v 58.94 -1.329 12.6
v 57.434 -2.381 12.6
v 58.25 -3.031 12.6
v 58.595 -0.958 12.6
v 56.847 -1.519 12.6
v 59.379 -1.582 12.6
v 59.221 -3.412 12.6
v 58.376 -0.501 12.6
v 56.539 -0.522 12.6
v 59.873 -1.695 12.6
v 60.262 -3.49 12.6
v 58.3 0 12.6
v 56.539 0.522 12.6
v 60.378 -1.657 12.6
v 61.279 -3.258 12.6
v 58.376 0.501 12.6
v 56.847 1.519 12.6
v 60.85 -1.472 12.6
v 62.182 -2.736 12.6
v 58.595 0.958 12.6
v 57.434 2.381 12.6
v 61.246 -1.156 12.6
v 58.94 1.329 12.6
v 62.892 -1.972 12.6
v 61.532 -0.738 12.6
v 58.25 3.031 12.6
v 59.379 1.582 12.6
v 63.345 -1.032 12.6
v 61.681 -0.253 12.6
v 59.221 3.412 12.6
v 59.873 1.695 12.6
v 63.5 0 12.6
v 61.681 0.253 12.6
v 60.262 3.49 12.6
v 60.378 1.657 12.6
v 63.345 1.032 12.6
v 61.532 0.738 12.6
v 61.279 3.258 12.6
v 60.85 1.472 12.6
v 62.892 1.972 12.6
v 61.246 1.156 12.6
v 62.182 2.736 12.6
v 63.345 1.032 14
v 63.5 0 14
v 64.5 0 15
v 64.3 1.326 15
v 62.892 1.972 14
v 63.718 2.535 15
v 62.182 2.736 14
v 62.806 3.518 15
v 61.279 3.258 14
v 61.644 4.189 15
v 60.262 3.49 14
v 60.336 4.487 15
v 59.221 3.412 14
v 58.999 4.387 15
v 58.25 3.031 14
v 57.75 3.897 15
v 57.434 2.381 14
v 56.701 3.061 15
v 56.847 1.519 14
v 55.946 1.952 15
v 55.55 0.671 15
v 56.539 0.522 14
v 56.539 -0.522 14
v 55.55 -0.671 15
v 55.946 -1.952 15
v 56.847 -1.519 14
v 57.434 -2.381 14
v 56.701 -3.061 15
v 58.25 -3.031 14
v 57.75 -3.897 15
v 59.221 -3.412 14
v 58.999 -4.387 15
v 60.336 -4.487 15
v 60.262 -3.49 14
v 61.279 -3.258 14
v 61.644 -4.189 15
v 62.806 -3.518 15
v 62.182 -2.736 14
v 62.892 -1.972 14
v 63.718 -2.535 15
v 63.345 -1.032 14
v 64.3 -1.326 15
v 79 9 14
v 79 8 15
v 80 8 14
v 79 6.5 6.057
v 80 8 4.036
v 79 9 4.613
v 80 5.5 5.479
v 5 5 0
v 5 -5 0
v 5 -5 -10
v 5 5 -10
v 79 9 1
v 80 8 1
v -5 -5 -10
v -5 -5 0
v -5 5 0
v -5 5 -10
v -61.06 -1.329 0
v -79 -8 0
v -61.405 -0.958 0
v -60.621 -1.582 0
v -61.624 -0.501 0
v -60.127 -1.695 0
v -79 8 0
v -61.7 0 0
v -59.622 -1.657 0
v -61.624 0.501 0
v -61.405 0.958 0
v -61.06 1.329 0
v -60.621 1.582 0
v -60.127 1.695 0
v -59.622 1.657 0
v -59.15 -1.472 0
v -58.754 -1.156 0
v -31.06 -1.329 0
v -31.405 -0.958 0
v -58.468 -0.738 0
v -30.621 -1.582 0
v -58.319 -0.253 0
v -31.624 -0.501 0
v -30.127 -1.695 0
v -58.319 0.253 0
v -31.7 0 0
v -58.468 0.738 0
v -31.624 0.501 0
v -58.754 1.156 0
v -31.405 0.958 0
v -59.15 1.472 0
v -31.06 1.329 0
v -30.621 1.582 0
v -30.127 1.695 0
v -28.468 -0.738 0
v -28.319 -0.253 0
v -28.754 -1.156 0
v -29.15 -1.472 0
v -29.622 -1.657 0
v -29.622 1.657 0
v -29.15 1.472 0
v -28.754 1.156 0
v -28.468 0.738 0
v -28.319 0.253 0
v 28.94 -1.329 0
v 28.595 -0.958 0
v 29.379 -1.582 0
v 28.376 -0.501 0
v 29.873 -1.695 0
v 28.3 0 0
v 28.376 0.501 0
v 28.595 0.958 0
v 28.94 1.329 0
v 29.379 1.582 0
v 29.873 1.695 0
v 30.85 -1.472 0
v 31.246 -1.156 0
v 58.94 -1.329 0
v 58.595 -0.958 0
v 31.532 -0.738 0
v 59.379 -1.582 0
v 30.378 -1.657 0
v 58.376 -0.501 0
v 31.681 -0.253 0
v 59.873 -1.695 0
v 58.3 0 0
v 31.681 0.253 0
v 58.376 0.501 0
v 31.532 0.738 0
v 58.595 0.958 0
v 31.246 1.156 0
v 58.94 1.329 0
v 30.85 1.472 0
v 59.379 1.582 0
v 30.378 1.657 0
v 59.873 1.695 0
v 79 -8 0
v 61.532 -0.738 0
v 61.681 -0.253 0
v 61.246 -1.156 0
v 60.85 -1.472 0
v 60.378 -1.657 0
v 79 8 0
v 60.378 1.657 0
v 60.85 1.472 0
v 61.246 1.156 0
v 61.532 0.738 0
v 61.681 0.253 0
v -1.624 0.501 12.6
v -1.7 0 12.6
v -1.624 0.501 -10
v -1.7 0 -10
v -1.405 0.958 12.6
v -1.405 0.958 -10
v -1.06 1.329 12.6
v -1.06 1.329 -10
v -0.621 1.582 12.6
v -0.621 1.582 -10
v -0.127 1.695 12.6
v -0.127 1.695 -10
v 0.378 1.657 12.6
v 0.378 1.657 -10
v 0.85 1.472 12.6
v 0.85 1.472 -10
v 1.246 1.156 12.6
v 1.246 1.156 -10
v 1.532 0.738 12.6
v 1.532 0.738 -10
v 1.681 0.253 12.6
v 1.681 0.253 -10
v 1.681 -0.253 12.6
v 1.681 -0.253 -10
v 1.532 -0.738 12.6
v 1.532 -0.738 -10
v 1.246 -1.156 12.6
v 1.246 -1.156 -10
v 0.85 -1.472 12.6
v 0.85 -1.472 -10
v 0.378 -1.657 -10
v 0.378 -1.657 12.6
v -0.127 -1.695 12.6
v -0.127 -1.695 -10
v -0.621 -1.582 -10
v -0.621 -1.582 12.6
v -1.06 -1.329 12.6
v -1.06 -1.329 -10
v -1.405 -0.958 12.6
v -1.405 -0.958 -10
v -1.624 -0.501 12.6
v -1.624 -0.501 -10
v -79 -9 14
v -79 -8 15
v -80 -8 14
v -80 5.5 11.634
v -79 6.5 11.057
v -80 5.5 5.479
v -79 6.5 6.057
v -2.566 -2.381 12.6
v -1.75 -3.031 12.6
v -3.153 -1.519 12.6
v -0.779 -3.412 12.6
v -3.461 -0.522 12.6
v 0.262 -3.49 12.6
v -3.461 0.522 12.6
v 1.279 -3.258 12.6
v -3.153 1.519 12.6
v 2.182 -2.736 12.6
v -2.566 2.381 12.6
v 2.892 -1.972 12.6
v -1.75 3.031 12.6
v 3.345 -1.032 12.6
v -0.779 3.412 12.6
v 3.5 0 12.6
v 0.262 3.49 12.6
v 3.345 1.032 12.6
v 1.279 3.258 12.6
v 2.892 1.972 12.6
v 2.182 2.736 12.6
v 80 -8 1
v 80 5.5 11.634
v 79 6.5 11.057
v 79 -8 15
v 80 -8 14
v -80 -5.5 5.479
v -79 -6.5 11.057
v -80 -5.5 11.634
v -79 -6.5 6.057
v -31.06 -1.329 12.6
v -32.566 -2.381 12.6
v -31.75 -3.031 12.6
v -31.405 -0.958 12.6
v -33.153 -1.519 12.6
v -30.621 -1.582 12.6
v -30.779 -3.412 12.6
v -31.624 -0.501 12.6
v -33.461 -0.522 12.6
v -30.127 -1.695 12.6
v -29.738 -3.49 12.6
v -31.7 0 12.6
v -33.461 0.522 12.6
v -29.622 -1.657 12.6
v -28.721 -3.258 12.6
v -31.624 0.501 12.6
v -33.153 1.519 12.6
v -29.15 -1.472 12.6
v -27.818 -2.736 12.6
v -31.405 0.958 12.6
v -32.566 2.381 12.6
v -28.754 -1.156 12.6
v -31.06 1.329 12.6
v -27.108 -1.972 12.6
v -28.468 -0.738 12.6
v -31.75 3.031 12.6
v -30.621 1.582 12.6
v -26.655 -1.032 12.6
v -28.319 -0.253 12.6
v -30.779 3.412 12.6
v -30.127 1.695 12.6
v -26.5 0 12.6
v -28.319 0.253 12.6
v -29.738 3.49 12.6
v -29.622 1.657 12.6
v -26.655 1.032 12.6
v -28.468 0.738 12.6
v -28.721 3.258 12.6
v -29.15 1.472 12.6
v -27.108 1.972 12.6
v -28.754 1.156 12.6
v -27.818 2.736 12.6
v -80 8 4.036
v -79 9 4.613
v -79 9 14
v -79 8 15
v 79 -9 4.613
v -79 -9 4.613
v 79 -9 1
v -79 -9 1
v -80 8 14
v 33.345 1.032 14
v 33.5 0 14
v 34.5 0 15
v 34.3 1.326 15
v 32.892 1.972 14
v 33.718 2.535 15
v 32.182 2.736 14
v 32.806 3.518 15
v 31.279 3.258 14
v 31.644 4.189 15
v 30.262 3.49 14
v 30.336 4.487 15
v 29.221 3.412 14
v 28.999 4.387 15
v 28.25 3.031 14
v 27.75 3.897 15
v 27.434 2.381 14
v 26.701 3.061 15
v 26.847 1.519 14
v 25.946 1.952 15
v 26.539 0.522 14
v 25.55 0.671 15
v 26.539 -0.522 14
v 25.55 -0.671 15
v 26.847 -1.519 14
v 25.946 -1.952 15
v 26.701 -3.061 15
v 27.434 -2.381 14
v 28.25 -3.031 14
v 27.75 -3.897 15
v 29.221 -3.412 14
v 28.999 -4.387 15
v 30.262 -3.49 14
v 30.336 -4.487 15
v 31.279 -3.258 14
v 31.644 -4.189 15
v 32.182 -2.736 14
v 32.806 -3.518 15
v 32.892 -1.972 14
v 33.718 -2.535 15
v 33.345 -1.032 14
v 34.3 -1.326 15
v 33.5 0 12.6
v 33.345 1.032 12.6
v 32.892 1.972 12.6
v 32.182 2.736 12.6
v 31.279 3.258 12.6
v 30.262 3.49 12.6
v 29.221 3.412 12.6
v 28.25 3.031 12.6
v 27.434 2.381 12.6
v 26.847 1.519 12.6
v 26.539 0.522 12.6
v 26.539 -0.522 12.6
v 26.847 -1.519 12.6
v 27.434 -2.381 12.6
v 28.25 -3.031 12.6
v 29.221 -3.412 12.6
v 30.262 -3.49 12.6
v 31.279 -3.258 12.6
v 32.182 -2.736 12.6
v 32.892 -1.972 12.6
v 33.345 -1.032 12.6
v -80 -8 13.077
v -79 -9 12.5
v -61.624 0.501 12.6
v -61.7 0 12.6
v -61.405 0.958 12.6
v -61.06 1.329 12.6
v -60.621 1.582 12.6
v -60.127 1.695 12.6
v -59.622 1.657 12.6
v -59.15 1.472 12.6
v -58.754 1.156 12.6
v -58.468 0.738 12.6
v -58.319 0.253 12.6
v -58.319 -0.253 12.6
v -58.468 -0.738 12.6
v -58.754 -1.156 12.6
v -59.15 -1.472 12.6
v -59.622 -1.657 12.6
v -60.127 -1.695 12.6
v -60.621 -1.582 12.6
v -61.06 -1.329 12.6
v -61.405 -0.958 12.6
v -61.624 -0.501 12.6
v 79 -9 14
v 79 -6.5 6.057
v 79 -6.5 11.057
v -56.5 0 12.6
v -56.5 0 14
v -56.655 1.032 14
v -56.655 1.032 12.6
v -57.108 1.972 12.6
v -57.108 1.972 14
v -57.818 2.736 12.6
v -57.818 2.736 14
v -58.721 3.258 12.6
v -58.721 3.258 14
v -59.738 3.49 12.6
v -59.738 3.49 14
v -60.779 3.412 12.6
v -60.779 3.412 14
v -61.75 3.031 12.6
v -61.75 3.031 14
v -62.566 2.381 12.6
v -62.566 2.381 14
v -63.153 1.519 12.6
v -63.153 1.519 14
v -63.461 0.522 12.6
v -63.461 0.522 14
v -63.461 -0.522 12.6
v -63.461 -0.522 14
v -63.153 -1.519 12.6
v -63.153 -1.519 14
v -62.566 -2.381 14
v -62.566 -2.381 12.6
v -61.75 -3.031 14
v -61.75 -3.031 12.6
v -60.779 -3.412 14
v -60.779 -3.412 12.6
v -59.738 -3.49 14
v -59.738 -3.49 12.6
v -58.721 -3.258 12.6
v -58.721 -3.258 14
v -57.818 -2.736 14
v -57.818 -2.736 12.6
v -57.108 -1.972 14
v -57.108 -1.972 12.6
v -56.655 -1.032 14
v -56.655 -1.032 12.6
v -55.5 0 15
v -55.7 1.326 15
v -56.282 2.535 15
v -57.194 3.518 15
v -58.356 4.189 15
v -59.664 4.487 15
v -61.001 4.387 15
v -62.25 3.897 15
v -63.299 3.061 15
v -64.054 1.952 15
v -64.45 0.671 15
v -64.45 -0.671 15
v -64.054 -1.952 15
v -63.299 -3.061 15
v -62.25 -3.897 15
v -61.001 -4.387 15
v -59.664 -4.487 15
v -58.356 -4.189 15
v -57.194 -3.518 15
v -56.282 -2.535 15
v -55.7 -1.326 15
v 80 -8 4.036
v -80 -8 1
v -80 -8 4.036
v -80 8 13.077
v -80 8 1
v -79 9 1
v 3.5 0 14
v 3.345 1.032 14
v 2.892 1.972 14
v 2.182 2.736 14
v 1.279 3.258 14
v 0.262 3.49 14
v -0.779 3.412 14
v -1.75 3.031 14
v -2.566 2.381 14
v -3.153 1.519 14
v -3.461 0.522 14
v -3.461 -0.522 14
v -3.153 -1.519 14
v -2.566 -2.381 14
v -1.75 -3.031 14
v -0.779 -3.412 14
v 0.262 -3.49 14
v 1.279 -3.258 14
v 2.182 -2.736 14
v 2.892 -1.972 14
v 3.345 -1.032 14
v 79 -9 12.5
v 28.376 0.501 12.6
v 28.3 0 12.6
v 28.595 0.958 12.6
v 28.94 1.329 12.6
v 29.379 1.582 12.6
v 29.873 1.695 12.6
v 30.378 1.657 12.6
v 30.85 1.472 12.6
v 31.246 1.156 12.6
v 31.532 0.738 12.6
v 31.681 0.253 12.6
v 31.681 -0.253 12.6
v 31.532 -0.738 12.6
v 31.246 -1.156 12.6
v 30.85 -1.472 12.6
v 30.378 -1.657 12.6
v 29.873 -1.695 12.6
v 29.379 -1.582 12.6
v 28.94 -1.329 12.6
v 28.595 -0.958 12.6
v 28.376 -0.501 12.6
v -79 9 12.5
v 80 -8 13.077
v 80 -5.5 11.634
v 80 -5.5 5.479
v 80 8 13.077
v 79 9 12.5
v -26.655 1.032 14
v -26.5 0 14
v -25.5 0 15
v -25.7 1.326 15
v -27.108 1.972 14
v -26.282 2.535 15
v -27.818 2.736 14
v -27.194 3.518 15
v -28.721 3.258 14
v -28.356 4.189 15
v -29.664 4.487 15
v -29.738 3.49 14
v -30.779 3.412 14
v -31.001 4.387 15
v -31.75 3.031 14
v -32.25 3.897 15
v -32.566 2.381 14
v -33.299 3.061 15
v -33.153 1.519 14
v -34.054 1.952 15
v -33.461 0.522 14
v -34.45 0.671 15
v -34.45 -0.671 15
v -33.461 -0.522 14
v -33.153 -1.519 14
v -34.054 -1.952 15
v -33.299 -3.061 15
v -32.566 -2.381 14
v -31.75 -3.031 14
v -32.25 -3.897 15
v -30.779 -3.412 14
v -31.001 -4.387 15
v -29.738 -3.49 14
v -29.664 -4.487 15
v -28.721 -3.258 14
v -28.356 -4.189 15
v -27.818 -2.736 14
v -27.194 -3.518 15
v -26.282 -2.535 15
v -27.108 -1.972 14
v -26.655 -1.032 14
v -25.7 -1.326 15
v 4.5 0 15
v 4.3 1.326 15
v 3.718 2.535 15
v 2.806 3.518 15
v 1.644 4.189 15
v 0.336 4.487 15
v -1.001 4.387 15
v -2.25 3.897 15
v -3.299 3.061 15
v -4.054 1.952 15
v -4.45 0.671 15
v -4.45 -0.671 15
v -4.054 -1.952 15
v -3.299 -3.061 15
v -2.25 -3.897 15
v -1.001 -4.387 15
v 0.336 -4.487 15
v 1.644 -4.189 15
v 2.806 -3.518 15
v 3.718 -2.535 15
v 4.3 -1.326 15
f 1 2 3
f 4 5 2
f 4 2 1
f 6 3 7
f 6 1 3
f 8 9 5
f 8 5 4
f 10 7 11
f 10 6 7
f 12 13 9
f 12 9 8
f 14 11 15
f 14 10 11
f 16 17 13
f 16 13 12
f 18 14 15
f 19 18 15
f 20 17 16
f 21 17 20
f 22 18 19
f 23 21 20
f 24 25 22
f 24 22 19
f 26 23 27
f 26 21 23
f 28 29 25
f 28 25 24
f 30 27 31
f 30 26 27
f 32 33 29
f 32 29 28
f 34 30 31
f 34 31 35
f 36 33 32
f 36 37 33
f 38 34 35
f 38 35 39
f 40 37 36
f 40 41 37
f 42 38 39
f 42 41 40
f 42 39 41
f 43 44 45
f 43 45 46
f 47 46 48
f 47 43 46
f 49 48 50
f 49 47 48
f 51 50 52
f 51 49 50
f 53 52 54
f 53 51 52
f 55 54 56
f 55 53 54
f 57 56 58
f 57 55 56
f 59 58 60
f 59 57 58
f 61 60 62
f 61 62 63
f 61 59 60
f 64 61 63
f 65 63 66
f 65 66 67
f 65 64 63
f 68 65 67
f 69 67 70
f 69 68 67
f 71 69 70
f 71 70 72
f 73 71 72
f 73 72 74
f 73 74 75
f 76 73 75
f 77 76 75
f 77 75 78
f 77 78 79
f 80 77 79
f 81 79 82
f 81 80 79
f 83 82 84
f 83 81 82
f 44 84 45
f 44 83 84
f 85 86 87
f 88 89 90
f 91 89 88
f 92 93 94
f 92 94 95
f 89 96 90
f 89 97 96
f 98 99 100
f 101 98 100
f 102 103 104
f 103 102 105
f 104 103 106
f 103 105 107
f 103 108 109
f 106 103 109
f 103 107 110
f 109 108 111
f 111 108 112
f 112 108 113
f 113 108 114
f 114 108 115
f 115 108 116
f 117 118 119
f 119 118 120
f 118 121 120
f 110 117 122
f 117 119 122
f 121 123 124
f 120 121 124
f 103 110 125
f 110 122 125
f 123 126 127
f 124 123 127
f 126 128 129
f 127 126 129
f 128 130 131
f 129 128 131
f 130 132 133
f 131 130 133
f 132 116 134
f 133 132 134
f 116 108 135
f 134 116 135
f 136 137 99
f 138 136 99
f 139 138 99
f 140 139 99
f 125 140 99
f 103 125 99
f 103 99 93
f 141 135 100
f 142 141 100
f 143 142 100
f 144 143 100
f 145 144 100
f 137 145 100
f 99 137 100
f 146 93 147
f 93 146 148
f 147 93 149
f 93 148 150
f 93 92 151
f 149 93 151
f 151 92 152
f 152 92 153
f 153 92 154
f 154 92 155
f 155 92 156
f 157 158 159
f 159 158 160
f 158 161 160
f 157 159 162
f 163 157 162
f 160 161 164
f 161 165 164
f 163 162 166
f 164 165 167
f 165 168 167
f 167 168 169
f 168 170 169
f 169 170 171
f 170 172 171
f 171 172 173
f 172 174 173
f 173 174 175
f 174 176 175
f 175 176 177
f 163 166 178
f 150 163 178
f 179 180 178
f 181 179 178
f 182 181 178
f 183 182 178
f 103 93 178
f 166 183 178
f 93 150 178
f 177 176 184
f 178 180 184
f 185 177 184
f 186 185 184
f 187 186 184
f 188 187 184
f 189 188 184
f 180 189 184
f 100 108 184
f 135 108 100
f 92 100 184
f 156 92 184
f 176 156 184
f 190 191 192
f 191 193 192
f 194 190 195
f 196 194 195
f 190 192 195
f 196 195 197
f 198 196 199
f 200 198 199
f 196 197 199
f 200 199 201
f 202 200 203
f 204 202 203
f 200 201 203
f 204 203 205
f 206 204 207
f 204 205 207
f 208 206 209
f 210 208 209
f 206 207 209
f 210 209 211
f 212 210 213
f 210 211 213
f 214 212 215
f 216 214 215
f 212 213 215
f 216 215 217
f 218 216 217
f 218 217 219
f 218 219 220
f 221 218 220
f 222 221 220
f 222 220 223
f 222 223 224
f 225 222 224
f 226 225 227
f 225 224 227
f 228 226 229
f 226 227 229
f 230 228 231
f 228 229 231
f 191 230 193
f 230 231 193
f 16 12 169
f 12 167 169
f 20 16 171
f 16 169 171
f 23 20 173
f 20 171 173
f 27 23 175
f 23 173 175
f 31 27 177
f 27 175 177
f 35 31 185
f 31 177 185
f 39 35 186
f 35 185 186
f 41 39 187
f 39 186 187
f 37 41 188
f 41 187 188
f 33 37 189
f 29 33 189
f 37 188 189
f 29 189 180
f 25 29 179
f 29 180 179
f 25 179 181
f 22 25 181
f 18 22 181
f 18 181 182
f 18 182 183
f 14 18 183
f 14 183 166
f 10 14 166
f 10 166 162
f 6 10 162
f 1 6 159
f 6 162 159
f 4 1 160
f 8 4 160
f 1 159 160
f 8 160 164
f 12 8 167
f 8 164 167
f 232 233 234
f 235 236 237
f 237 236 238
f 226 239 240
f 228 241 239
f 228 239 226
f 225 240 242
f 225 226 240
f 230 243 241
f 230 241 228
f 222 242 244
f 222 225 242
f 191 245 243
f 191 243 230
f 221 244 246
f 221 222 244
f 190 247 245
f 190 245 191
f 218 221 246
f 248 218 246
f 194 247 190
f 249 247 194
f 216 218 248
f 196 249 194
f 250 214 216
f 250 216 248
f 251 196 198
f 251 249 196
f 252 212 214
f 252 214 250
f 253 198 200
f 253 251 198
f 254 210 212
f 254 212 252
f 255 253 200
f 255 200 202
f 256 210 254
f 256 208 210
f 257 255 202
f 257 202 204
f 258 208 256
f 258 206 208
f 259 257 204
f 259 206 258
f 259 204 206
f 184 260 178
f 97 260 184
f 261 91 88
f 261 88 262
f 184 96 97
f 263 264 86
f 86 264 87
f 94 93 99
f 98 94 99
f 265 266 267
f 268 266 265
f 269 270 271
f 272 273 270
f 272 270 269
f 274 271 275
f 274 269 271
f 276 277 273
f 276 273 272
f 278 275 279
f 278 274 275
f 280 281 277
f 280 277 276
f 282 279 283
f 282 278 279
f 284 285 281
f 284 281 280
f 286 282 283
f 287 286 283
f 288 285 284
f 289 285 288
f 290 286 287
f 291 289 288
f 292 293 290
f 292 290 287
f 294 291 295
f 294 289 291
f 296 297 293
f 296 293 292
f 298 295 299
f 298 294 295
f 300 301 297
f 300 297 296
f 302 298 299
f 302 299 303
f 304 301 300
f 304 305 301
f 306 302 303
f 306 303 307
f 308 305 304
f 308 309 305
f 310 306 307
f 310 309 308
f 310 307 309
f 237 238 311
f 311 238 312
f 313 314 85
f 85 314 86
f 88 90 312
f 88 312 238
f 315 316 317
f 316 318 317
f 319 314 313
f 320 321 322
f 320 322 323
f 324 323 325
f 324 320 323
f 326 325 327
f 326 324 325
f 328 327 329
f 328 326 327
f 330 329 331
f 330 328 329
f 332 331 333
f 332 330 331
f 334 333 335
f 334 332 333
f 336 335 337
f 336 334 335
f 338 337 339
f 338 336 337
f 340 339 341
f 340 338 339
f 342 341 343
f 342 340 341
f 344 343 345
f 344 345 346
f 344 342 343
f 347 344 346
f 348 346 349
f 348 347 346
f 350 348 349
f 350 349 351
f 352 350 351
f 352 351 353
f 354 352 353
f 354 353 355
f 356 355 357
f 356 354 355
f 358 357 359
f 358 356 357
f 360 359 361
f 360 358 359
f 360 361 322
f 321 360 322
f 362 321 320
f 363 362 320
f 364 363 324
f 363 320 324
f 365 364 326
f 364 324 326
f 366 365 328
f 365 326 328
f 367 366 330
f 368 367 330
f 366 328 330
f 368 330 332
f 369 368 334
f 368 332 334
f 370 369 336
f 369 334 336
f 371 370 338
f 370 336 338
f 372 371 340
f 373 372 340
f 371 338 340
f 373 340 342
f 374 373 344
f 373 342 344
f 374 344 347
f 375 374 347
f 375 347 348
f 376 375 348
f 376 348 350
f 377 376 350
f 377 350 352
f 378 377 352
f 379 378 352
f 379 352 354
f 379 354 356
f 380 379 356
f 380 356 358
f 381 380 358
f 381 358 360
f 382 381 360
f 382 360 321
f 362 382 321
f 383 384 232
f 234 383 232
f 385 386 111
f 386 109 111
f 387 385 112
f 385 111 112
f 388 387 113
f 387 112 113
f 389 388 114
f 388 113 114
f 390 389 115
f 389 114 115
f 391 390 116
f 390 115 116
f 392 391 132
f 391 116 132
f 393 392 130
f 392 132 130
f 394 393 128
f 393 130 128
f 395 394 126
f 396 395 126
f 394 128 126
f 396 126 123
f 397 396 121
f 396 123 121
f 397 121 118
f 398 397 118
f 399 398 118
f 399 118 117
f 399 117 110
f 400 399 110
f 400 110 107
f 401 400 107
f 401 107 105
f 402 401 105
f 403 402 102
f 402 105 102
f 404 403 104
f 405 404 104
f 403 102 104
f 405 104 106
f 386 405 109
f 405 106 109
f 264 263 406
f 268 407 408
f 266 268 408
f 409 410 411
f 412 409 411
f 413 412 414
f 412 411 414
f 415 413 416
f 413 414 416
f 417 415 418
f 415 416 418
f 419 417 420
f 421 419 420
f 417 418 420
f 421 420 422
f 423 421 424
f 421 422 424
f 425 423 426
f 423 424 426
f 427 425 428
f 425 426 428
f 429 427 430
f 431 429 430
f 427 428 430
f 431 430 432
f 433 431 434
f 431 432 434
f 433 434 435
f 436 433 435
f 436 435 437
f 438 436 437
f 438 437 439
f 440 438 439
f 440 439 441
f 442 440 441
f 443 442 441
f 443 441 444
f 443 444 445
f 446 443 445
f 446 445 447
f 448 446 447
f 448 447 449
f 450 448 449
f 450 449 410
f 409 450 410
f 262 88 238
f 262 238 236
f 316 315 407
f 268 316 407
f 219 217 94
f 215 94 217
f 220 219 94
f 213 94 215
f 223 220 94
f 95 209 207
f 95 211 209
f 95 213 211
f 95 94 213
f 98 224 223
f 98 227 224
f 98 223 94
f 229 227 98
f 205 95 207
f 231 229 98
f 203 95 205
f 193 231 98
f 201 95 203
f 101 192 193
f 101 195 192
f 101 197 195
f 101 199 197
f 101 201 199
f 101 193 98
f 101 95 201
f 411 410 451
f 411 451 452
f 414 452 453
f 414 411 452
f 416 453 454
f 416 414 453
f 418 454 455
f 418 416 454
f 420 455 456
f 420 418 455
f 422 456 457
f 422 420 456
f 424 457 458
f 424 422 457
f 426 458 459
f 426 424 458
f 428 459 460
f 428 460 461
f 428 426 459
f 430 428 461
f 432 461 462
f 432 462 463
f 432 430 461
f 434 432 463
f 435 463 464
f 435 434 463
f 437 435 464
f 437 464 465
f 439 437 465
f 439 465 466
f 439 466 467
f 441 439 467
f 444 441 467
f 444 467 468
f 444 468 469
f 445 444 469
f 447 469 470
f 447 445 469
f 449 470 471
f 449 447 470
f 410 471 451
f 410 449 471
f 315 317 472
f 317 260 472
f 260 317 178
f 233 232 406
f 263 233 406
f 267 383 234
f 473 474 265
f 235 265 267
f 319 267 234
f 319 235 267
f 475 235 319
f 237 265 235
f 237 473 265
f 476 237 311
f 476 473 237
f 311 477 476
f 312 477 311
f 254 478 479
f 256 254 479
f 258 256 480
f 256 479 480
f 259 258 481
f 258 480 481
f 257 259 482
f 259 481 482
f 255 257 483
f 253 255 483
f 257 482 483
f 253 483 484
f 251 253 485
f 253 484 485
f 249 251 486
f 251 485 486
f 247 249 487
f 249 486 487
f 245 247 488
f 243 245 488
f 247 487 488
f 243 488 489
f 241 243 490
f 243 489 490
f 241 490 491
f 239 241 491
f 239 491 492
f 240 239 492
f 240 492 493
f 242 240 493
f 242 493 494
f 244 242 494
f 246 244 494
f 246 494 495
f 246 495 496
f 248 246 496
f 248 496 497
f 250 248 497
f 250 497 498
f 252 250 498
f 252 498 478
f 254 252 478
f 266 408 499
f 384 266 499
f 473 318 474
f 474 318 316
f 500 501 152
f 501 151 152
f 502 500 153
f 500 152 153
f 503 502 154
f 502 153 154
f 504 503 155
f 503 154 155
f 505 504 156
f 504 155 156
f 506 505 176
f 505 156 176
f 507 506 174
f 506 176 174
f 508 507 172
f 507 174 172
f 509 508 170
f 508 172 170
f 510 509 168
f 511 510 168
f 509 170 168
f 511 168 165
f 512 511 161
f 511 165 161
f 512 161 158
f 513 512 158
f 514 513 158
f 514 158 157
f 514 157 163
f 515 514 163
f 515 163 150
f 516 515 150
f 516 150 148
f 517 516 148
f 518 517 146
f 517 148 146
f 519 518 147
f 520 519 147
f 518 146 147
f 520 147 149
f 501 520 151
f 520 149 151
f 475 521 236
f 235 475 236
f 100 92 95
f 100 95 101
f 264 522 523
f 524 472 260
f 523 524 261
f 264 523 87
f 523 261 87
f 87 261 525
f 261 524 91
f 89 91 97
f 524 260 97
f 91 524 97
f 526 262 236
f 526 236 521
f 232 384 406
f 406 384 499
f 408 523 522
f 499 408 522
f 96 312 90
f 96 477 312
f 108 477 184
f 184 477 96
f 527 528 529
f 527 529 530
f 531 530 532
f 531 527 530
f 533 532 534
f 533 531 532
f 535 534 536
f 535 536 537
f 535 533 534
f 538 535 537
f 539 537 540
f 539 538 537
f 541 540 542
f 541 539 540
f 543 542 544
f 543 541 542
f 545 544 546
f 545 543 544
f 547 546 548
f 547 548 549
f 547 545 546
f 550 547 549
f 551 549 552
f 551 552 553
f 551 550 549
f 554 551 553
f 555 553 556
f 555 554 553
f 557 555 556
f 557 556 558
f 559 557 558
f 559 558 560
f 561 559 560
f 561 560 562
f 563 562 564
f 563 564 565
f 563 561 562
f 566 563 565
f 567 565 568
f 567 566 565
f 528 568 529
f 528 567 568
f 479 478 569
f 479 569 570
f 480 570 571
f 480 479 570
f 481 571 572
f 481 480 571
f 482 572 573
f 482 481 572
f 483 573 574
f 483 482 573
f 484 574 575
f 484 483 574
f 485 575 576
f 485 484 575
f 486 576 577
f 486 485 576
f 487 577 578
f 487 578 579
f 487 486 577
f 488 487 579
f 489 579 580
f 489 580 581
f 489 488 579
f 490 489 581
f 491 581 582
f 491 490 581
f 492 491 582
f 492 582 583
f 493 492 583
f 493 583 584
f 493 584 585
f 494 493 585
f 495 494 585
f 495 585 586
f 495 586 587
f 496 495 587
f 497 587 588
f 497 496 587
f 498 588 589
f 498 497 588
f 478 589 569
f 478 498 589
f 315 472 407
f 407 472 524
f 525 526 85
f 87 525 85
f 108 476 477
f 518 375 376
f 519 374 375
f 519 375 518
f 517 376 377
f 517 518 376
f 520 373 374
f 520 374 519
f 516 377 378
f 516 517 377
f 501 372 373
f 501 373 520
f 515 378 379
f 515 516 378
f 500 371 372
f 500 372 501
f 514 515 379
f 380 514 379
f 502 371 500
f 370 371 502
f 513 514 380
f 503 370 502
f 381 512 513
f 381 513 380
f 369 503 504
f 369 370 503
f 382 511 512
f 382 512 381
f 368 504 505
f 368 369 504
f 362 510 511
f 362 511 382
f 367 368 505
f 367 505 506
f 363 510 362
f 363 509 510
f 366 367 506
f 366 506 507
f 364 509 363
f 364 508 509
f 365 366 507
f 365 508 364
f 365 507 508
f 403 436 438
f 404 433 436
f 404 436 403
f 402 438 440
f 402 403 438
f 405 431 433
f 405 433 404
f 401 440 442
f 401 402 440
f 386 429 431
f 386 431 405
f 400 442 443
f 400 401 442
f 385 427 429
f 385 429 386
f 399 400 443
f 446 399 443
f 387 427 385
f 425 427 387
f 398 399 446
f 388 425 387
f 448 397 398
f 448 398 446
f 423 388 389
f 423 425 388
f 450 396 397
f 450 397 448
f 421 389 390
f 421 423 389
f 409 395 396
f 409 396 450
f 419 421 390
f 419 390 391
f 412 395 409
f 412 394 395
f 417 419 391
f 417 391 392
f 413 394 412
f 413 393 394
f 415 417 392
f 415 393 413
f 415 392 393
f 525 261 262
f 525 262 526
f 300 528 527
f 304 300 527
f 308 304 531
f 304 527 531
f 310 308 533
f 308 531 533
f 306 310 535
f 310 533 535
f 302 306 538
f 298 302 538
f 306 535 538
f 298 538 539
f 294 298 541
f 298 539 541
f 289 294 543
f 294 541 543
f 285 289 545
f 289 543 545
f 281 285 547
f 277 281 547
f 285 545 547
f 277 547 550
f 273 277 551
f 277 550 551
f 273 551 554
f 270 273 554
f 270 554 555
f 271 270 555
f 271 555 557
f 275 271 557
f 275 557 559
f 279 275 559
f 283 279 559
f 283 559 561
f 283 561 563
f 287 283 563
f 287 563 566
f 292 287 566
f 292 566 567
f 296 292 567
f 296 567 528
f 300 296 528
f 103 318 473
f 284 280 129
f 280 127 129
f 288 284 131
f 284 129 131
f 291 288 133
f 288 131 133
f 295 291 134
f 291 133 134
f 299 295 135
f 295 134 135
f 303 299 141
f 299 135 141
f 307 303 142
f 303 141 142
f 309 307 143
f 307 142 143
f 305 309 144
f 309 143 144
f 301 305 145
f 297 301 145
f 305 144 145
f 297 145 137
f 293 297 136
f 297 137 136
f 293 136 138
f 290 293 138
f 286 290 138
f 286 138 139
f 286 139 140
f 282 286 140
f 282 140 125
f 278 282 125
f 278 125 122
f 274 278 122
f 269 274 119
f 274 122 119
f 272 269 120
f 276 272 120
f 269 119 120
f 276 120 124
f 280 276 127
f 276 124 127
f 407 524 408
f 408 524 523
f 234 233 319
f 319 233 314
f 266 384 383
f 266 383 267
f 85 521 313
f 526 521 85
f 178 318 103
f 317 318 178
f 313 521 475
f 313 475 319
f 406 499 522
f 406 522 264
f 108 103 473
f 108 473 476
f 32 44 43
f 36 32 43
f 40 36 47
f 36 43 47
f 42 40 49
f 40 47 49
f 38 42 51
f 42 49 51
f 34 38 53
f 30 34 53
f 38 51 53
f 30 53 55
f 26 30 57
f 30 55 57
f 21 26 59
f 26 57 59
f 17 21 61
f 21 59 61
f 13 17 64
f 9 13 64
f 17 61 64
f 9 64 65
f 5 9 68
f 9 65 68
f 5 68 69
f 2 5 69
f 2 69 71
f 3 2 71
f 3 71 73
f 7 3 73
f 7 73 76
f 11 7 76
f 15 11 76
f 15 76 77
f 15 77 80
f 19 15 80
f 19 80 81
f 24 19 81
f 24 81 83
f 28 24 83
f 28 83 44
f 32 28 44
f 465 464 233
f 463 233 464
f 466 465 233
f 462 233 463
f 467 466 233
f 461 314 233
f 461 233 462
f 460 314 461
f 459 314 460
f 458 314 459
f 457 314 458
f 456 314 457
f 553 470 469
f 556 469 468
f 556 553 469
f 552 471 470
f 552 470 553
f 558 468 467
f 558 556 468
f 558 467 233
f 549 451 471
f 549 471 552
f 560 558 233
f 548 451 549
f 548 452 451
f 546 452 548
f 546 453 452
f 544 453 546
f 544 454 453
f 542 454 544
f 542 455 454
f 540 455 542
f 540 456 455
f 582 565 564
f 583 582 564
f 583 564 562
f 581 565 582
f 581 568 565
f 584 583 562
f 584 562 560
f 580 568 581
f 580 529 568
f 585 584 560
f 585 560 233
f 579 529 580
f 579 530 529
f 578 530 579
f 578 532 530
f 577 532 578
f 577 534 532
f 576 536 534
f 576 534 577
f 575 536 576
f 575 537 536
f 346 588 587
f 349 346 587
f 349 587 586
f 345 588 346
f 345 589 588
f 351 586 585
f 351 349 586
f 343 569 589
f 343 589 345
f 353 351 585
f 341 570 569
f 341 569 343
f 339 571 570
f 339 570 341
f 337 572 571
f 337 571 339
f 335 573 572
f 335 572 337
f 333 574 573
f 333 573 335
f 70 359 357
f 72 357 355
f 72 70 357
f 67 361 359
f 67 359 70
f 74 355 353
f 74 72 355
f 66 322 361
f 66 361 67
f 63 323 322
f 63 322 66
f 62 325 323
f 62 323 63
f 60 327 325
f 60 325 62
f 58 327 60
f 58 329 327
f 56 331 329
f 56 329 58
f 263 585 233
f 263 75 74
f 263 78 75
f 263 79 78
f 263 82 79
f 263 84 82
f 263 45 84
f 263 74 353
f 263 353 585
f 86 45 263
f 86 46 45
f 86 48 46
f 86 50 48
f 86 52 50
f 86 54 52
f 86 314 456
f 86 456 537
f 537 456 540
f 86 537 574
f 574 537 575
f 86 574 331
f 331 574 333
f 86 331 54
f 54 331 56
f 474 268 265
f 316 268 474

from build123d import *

# Parameters (mm, degrees)
SKETCH1_W                                = 160
SKETCH1_H                                = 18
BOSS_EXTRUDE1_DEPTH                      = 15
CUT_EXTRUDE1_DEPTH                       = 161.953409408
SKETCH3_W                                = 10
SKETCH3_H                                = 10
BOSS_EXTRUDE2_DEPTH                      = 10
CBORE_FOR_M3_PAN_HEAD_SCREW1_D           = 3.4
CBORE_FOR_M3_PAN_HEAD_SCREW1_CBORE_D     = 7
CBORE_FOR_M3_PAN_HEAD_SCREW1_CBORE_DEPTH = 2.4
CHAMFER1_SIZE                            = 1
LPATTERN2_COUNT                          = 3
LPATTERN2_PITCH                          = 30
LPATTERN3_COUNT                          = 3
LPATTERN3_PITCH                          = 30
CHAMFER2_SIZE                            = 1


with BuildPart() as part:
    # Sketch1 → Boss-Extrude1 (new body)
    with BuildSketch(Plane.XY):
        Rectangle(SKETCH1_W, SKETCH1_H)
    extrude(amount=BOSS_EXTRUDE1_DEPTH)

    # Sketch2 → Cut-Extrude1 (cut, through all)
    with BuildSketch(Plane(origin=(80, 0, 0), x_dir=(0, 0, -1), z_dir=(1, 0, 0))):
        Polygon((-12.5, 9), (-4.613248654, 9), (-6.056624327, 6.5), (-11.056624327, 6.5), align=None)
        Polygon((-11.056624327, -6.5), (-12.5, -9), (-4.613248654, -9), (-6.056624327, -6.5), align=None)
    extrude(amount=-CUT_EXTRUDE1_DEPTH, mode=Mode.SUBTRACT)

    # Sketch3 → Boss-Extrude2 (add)
    with BuildSketch(Plane(origin=(0, 0, 0), x_dir=(-1, 0, 0), z_dir=(0, 0, -1))):
        Rectangle(SKETCH3_W, SKETCH3_H)
    extrude(amount=BOSS_EXTRUDE2_DEPTH)

    # CBORE for M3 Pan Head Screw1 (through all)
    with Locations(Plane.XY.offset(15)):
        with Locations((0, 0)):
            cbore_for_m3_pan_head_screw1 = CounterBoreHole(CBORE_FOR_M3_PAN_HEAD_SCREW1_D / 2, CBORE_FOR_M3_PAN_HEAD_SCREW1_CBORE_D / 2, CBORE_FOR_M3_PAN_HEAD_SCREW1_CBORE_DEPTH)

    # Chamfer1
    chamfer1_edges = [part.edges().sort_by_distance(p)[0] for p in [
        (-80, 0, 15),
        (0, -9, 15),
        (80, -9, 2.306624327),
        (-80, -9, 2.306624327),
        (-80, 9, 2.306624327),
        (80, 9, 2.306624327),
        (-80, 7.75, 11.778312164),
        (-80, 7.75, 5.334936491),
        (-80, 6.5, 8.556624327),
        (80, 7.75, 11.778312164),
        (80, 6.5, 8.556624327),
        (80, 7.75, 5.334936491),
        (-80, -6.5, 8.556624327),
        (-80, -7.75, 5.334936491),
        (-80, -7.75, 11.778312164),
        (80, -6.5, 8.556624327),
        (80, -7.75, 11.778312164),
        (80, -7.75, 5.334936491),
        (80, 0, 15),
        (0, -9, 0),
        (-80, 0, 0),
        (0, 9, 0),
        (80, 0, 0),
        (-3.5, 0, 15),
        (0, 9, 15),
        (80, -9, 13.75),
        (-80, -9, 13.75),
        (-80, 9, 13.75),
        (80, 9, 13.75),
    ]]
    chamfer(chamfer1_edges, length=CHAMFER1_SIZE)

    # LPattern2: CBORE for M3 Pan Head Screw1 ×3
    with Locations(*[(i * LPATTERN2_PITCH, 0, 0) for i in range(1, LPATTERN2_COUNT)]):
        add(cbore_for_m3_pan_head_screw1, mode=Mode.SUBTRACT)

    # LPattern3: CBORE for M3 Pan Head Screw1 ×3
    with Locations(*[(-i * LPATTERN3_PITCH, 0, 0) for i in range(1, LPATTERN3_COUNT)]):
        add(cbore_for_m3_pan_head_screw1, mode=Mode.SUBTRACT)

    # Chamfer2
    chamfer2_edges = [part.edges().sort_by_distance(p)[0] for p in [
        (26.5, 0, 15),
        (56.5, 0, 15),
        (-33.5, 0, 15),
        (-63.5, 0, 15),
    ]]
    chamfer(chamfer2_edges, length=CHAMFER2_SIZE)


solid = part.part
